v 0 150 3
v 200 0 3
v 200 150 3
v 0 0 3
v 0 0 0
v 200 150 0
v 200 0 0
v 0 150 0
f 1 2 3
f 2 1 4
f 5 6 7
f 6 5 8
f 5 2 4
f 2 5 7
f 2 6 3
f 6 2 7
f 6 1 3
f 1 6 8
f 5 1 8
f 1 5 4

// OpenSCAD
$fn = 64;

length = 200;
width  = 150;
thickness = 3;

cube([length, width, thickness], center = false);
